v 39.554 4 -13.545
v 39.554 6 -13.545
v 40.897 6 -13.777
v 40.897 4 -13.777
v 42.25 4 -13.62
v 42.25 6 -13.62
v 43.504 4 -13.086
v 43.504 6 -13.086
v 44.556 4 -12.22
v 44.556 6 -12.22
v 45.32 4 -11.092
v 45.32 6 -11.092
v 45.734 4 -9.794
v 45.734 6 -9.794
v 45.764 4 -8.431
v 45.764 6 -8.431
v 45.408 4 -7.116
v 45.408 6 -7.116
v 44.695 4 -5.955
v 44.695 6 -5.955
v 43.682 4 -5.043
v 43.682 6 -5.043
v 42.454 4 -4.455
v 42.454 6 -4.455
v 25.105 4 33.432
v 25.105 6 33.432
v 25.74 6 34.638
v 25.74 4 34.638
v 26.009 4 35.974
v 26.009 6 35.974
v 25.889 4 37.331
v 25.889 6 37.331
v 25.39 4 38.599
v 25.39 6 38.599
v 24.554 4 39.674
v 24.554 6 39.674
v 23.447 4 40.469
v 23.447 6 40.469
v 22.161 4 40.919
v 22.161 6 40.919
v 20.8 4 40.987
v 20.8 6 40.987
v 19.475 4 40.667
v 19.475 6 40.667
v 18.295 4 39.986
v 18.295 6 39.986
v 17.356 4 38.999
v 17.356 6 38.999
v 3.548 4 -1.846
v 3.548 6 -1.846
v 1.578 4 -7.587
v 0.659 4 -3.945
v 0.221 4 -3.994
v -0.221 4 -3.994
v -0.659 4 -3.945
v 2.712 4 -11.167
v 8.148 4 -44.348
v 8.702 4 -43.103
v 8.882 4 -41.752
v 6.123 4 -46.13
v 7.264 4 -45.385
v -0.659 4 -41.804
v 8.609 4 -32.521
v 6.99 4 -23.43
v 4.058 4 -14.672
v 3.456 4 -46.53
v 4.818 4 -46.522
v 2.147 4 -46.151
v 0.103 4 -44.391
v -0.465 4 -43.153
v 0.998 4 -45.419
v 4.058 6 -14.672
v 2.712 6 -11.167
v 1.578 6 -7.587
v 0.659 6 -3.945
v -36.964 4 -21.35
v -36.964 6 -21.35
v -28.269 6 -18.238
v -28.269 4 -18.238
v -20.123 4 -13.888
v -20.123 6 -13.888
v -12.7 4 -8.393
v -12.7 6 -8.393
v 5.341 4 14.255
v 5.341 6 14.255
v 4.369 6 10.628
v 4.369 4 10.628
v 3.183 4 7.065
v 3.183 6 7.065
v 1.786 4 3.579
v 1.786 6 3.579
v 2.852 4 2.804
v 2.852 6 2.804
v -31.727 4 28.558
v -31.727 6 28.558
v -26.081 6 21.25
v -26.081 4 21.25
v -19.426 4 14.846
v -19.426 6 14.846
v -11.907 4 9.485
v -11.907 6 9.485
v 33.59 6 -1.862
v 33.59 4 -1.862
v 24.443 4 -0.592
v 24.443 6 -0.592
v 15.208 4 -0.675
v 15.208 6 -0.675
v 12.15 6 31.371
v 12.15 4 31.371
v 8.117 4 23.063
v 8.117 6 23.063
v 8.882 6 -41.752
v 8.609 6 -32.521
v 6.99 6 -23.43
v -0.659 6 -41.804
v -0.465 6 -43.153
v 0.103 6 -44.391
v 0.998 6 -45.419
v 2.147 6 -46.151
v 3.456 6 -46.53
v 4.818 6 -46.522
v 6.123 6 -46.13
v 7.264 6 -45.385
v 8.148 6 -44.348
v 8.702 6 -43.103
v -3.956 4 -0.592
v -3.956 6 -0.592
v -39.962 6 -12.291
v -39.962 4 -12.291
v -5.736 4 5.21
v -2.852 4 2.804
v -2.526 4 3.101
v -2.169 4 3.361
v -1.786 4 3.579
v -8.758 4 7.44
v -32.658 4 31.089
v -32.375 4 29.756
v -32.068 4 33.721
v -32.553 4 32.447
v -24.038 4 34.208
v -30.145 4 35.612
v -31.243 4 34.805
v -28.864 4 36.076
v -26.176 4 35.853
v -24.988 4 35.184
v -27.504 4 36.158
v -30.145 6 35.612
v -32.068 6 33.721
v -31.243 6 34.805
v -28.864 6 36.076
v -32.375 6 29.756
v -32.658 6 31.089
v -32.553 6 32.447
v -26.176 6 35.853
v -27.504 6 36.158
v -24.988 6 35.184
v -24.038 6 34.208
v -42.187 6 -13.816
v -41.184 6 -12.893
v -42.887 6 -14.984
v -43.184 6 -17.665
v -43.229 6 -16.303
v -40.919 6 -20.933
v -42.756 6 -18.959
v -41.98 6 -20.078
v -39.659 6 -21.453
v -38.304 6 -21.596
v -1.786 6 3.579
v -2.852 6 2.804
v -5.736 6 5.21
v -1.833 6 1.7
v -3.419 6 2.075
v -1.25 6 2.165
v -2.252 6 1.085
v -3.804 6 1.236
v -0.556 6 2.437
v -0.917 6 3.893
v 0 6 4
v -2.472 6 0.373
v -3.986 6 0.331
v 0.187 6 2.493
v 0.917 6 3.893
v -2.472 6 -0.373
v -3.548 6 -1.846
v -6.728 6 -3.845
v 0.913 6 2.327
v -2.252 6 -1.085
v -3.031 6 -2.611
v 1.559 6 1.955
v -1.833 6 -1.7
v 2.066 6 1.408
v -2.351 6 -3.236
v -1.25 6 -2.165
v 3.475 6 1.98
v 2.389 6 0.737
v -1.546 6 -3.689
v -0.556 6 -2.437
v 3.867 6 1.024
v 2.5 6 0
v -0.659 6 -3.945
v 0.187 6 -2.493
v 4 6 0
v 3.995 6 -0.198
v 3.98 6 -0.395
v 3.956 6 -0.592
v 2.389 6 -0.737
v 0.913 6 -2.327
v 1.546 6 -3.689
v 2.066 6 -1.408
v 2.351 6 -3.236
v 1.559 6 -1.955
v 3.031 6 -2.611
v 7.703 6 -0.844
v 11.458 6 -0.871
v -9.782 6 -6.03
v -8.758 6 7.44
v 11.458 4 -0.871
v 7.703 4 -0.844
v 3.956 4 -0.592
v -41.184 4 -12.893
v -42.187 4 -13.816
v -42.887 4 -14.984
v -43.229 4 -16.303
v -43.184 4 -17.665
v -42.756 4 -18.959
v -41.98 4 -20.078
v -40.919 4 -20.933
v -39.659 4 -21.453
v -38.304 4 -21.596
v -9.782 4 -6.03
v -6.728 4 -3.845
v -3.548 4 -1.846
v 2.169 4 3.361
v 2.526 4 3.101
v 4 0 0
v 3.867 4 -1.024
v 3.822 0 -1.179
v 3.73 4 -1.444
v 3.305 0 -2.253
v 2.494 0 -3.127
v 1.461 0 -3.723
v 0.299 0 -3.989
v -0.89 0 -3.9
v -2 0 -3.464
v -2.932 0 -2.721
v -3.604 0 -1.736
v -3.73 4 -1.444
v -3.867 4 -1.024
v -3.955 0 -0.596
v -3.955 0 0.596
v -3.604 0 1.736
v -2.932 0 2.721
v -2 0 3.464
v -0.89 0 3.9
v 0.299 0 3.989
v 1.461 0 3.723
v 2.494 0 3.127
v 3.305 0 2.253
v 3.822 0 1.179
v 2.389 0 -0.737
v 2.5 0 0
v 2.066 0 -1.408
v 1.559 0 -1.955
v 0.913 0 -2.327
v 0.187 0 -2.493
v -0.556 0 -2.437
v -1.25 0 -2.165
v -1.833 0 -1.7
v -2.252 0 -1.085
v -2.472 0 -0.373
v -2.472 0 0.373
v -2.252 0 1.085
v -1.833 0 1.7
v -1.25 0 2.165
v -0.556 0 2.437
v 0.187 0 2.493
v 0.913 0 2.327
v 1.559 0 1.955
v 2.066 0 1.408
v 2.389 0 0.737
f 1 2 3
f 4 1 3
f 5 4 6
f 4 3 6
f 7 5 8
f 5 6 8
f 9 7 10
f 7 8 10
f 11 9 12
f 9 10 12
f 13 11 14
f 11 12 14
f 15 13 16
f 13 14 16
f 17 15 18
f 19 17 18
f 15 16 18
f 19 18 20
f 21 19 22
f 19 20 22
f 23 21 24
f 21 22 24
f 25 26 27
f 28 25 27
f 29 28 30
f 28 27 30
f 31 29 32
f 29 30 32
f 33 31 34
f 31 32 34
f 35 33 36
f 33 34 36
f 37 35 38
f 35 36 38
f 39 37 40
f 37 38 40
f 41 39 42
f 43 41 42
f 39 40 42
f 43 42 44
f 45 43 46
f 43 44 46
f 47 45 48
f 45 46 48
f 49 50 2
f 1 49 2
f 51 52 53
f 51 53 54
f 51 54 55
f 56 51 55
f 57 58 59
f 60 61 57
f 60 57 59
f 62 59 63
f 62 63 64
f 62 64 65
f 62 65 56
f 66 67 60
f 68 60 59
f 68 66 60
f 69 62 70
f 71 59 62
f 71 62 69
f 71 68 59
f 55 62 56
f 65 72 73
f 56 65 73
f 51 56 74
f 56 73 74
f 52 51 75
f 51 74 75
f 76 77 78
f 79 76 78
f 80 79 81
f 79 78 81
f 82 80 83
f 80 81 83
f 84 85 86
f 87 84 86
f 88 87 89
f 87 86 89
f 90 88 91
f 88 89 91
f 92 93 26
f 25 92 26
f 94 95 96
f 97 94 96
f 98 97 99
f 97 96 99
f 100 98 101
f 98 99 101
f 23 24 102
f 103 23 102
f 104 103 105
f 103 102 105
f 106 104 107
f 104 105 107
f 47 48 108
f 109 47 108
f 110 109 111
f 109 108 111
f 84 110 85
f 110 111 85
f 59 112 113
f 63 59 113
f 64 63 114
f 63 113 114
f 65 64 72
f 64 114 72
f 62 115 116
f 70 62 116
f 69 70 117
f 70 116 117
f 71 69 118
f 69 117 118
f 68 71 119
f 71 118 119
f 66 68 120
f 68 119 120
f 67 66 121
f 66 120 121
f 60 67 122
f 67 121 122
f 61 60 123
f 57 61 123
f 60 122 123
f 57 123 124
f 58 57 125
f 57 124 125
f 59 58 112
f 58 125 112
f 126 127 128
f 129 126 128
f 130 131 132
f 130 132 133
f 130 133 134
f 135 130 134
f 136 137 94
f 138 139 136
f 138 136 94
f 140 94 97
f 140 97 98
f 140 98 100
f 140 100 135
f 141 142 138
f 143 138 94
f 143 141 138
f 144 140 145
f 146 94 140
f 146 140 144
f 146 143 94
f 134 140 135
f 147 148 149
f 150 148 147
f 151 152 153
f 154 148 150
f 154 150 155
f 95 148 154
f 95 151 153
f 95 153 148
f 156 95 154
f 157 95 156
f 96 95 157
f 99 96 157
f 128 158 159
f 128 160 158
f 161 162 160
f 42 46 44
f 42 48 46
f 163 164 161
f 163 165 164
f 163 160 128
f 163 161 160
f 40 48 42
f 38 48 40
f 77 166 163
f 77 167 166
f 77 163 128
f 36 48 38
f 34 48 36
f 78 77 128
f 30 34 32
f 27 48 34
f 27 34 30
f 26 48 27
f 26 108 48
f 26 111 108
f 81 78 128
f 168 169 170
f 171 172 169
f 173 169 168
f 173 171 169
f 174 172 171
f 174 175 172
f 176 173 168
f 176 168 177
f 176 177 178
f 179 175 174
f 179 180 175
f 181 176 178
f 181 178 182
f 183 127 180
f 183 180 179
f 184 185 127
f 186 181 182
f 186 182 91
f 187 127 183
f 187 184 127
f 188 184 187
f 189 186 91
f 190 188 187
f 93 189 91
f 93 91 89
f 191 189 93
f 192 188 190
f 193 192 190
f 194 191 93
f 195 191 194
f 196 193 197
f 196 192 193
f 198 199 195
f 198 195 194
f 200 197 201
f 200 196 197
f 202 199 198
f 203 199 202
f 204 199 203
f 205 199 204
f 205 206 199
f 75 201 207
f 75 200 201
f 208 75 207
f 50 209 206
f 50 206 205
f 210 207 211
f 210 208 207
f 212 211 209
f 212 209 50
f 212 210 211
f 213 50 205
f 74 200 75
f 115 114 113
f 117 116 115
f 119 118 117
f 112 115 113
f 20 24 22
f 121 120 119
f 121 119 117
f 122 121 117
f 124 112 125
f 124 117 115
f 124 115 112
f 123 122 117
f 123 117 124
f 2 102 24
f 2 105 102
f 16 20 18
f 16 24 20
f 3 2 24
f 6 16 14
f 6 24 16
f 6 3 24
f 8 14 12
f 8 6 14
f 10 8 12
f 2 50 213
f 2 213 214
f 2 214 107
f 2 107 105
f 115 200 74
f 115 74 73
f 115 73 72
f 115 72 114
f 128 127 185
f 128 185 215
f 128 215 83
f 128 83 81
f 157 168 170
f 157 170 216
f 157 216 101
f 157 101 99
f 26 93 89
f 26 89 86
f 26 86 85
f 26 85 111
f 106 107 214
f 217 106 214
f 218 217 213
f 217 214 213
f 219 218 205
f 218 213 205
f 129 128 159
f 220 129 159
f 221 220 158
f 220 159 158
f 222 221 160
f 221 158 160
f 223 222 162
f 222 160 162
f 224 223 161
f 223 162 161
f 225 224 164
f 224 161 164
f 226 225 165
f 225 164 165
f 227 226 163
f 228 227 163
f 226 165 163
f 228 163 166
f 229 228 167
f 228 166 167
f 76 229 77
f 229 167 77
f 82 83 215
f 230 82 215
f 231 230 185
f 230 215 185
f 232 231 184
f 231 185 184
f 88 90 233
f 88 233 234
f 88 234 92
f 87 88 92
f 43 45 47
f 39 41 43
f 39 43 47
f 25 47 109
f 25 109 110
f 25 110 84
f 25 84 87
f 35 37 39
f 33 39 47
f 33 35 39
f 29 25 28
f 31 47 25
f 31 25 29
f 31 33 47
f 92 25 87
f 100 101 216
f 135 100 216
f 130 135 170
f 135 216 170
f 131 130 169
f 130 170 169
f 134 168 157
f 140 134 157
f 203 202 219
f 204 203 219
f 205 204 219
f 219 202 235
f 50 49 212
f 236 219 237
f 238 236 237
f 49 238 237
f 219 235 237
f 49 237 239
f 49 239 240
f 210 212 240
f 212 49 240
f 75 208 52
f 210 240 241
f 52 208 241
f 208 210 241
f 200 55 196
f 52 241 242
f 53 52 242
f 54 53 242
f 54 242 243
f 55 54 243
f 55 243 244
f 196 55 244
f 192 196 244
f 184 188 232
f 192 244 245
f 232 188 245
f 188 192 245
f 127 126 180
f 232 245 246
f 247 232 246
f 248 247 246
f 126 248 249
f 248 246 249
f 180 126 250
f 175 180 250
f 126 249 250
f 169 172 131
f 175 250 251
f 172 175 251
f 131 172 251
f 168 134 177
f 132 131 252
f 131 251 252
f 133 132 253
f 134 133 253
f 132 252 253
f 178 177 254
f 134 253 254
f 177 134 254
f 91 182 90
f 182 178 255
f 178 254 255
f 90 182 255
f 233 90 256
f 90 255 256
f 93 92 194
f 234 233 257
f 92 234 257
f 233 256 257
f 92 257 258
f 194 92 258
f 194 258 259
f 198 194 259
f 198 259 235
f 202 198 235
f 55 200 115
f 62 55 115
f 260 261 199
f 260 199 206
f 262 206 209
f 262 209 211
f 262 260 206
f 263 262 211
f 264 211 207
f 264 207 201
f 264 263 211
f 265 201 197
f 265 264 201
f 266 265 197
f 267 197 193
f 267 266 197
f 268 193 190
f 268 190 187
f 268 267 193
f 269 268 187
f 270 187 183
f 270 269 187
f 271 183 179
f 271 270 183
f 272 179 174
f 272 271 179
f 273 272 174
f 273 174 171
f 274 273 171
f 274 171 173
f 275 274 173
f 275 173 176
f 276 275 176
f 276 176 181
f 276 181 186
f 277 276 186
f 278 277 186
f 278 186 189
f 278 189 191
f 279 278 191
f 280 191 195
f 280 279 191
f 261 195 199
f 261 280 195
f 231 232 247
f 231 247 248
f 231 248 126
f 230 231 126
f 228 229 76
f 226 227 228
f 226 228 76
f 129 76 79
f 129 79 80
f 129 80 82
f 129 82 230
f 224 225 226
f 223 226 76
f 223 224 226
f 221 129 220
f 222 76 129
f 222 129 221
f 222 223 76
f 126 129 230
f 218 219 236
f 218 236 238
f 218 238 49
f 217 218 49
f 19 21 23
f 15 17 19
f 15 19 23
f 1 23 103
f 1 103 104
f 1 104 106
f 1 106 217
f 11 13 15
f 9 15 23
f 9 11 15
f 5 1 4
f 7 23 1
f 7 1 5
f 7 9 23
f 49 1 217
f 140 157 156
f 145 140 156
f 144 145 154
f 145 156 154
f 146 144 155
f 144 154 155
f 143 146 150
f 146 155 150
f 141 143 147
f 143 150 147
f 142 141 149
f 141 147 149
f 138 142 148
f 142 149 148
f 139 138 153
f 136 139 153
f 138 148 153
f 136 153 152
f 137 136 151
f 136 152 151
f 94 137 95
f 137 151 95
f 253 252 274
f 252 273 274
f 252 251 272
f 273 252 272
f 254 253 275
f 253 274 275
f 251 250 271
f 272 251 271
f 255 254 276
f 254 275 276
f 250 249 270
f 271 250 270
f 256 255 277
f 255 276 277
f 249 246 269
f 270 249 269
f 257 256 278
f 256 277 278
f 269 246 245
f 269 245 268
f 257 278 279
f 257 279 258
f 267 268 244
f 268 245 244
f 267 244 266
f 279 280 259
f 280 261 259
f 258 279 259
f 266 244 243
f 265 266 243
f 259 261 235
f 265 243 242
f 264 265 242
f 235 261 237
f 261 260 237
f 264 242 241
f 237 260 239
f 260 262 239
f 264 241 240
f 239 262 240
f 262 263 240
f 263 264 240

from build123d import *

# Parameters (mm, degrees)
SKETCH1_R           = 4
SKETCH1_R_2         = 2.5
BOSS_EXTRUDE1_DEPTH = 6
BOSS_EXTRUDE2_START = -2
BOSS_EXTRUDE2_DEPTH = 2
CIRPATTERN1_COUNT   = 5


with BuildPart() as part:
    # Sketch1 → Boss-Extrude1 (new body)
    with BuildSketch(Plane(origin=(0, 0, 0), x_dir=(1, 0, 0), z_dir=(0, 1, 0))):
        Circle(SKETCH1_R)
        Circle(SKETCH1_R_2, mode=Mode.SUBTRACT)
    extrude(amount=BOSS_EXTRUDE1_DEPTH)

    # Sketch2 → Boss-Extrude2 (add)
    with BuildSketch(Plane(origin=(0, 6, 0), x_dir=(1, 0, 0), z_dir=(0, 1, 0)).offset(BOSS_EXTRUDE2_START)):
        with BuildLine():
            Line((-0.659397634, 3.945274992), (-0.659397634, 41.803919823))
            ThreePointArc((-0.659397634, 41.803919823), (4.137285492, 46.574729802), (8.882082768, 41.752313842))
            ThreePointArc((8.882082768, 41.752313842), (7.966424676, 27.945777977), (4.058060811, 14.672362658))
            ThreePointArc((4.058060811, 14.672362658), (2.118281369, 9.384999918), (0.659397634, 3.945274992))
            ThreePointArc((0.659397634, 3.945274992), (0, 4), (-0.659397634, 3.945274992))
        make_face()
    boss_extrude2 = extrude(amount=BOSS_EXTRUDE2_DEPTH)

    # CirPattern1: Boss-Extrude2 ×5 about axis
    cirpattern1_axis = Axis((0, -0.3, 0), (0, 1, 0))
    for i in range(1, CIRPATTERN1_COUNT):
        add(boss_extrude2.rotate(cirpattern1_axis, i * 360 / CIRPATTERN1_COUNT))


solid = part.part
